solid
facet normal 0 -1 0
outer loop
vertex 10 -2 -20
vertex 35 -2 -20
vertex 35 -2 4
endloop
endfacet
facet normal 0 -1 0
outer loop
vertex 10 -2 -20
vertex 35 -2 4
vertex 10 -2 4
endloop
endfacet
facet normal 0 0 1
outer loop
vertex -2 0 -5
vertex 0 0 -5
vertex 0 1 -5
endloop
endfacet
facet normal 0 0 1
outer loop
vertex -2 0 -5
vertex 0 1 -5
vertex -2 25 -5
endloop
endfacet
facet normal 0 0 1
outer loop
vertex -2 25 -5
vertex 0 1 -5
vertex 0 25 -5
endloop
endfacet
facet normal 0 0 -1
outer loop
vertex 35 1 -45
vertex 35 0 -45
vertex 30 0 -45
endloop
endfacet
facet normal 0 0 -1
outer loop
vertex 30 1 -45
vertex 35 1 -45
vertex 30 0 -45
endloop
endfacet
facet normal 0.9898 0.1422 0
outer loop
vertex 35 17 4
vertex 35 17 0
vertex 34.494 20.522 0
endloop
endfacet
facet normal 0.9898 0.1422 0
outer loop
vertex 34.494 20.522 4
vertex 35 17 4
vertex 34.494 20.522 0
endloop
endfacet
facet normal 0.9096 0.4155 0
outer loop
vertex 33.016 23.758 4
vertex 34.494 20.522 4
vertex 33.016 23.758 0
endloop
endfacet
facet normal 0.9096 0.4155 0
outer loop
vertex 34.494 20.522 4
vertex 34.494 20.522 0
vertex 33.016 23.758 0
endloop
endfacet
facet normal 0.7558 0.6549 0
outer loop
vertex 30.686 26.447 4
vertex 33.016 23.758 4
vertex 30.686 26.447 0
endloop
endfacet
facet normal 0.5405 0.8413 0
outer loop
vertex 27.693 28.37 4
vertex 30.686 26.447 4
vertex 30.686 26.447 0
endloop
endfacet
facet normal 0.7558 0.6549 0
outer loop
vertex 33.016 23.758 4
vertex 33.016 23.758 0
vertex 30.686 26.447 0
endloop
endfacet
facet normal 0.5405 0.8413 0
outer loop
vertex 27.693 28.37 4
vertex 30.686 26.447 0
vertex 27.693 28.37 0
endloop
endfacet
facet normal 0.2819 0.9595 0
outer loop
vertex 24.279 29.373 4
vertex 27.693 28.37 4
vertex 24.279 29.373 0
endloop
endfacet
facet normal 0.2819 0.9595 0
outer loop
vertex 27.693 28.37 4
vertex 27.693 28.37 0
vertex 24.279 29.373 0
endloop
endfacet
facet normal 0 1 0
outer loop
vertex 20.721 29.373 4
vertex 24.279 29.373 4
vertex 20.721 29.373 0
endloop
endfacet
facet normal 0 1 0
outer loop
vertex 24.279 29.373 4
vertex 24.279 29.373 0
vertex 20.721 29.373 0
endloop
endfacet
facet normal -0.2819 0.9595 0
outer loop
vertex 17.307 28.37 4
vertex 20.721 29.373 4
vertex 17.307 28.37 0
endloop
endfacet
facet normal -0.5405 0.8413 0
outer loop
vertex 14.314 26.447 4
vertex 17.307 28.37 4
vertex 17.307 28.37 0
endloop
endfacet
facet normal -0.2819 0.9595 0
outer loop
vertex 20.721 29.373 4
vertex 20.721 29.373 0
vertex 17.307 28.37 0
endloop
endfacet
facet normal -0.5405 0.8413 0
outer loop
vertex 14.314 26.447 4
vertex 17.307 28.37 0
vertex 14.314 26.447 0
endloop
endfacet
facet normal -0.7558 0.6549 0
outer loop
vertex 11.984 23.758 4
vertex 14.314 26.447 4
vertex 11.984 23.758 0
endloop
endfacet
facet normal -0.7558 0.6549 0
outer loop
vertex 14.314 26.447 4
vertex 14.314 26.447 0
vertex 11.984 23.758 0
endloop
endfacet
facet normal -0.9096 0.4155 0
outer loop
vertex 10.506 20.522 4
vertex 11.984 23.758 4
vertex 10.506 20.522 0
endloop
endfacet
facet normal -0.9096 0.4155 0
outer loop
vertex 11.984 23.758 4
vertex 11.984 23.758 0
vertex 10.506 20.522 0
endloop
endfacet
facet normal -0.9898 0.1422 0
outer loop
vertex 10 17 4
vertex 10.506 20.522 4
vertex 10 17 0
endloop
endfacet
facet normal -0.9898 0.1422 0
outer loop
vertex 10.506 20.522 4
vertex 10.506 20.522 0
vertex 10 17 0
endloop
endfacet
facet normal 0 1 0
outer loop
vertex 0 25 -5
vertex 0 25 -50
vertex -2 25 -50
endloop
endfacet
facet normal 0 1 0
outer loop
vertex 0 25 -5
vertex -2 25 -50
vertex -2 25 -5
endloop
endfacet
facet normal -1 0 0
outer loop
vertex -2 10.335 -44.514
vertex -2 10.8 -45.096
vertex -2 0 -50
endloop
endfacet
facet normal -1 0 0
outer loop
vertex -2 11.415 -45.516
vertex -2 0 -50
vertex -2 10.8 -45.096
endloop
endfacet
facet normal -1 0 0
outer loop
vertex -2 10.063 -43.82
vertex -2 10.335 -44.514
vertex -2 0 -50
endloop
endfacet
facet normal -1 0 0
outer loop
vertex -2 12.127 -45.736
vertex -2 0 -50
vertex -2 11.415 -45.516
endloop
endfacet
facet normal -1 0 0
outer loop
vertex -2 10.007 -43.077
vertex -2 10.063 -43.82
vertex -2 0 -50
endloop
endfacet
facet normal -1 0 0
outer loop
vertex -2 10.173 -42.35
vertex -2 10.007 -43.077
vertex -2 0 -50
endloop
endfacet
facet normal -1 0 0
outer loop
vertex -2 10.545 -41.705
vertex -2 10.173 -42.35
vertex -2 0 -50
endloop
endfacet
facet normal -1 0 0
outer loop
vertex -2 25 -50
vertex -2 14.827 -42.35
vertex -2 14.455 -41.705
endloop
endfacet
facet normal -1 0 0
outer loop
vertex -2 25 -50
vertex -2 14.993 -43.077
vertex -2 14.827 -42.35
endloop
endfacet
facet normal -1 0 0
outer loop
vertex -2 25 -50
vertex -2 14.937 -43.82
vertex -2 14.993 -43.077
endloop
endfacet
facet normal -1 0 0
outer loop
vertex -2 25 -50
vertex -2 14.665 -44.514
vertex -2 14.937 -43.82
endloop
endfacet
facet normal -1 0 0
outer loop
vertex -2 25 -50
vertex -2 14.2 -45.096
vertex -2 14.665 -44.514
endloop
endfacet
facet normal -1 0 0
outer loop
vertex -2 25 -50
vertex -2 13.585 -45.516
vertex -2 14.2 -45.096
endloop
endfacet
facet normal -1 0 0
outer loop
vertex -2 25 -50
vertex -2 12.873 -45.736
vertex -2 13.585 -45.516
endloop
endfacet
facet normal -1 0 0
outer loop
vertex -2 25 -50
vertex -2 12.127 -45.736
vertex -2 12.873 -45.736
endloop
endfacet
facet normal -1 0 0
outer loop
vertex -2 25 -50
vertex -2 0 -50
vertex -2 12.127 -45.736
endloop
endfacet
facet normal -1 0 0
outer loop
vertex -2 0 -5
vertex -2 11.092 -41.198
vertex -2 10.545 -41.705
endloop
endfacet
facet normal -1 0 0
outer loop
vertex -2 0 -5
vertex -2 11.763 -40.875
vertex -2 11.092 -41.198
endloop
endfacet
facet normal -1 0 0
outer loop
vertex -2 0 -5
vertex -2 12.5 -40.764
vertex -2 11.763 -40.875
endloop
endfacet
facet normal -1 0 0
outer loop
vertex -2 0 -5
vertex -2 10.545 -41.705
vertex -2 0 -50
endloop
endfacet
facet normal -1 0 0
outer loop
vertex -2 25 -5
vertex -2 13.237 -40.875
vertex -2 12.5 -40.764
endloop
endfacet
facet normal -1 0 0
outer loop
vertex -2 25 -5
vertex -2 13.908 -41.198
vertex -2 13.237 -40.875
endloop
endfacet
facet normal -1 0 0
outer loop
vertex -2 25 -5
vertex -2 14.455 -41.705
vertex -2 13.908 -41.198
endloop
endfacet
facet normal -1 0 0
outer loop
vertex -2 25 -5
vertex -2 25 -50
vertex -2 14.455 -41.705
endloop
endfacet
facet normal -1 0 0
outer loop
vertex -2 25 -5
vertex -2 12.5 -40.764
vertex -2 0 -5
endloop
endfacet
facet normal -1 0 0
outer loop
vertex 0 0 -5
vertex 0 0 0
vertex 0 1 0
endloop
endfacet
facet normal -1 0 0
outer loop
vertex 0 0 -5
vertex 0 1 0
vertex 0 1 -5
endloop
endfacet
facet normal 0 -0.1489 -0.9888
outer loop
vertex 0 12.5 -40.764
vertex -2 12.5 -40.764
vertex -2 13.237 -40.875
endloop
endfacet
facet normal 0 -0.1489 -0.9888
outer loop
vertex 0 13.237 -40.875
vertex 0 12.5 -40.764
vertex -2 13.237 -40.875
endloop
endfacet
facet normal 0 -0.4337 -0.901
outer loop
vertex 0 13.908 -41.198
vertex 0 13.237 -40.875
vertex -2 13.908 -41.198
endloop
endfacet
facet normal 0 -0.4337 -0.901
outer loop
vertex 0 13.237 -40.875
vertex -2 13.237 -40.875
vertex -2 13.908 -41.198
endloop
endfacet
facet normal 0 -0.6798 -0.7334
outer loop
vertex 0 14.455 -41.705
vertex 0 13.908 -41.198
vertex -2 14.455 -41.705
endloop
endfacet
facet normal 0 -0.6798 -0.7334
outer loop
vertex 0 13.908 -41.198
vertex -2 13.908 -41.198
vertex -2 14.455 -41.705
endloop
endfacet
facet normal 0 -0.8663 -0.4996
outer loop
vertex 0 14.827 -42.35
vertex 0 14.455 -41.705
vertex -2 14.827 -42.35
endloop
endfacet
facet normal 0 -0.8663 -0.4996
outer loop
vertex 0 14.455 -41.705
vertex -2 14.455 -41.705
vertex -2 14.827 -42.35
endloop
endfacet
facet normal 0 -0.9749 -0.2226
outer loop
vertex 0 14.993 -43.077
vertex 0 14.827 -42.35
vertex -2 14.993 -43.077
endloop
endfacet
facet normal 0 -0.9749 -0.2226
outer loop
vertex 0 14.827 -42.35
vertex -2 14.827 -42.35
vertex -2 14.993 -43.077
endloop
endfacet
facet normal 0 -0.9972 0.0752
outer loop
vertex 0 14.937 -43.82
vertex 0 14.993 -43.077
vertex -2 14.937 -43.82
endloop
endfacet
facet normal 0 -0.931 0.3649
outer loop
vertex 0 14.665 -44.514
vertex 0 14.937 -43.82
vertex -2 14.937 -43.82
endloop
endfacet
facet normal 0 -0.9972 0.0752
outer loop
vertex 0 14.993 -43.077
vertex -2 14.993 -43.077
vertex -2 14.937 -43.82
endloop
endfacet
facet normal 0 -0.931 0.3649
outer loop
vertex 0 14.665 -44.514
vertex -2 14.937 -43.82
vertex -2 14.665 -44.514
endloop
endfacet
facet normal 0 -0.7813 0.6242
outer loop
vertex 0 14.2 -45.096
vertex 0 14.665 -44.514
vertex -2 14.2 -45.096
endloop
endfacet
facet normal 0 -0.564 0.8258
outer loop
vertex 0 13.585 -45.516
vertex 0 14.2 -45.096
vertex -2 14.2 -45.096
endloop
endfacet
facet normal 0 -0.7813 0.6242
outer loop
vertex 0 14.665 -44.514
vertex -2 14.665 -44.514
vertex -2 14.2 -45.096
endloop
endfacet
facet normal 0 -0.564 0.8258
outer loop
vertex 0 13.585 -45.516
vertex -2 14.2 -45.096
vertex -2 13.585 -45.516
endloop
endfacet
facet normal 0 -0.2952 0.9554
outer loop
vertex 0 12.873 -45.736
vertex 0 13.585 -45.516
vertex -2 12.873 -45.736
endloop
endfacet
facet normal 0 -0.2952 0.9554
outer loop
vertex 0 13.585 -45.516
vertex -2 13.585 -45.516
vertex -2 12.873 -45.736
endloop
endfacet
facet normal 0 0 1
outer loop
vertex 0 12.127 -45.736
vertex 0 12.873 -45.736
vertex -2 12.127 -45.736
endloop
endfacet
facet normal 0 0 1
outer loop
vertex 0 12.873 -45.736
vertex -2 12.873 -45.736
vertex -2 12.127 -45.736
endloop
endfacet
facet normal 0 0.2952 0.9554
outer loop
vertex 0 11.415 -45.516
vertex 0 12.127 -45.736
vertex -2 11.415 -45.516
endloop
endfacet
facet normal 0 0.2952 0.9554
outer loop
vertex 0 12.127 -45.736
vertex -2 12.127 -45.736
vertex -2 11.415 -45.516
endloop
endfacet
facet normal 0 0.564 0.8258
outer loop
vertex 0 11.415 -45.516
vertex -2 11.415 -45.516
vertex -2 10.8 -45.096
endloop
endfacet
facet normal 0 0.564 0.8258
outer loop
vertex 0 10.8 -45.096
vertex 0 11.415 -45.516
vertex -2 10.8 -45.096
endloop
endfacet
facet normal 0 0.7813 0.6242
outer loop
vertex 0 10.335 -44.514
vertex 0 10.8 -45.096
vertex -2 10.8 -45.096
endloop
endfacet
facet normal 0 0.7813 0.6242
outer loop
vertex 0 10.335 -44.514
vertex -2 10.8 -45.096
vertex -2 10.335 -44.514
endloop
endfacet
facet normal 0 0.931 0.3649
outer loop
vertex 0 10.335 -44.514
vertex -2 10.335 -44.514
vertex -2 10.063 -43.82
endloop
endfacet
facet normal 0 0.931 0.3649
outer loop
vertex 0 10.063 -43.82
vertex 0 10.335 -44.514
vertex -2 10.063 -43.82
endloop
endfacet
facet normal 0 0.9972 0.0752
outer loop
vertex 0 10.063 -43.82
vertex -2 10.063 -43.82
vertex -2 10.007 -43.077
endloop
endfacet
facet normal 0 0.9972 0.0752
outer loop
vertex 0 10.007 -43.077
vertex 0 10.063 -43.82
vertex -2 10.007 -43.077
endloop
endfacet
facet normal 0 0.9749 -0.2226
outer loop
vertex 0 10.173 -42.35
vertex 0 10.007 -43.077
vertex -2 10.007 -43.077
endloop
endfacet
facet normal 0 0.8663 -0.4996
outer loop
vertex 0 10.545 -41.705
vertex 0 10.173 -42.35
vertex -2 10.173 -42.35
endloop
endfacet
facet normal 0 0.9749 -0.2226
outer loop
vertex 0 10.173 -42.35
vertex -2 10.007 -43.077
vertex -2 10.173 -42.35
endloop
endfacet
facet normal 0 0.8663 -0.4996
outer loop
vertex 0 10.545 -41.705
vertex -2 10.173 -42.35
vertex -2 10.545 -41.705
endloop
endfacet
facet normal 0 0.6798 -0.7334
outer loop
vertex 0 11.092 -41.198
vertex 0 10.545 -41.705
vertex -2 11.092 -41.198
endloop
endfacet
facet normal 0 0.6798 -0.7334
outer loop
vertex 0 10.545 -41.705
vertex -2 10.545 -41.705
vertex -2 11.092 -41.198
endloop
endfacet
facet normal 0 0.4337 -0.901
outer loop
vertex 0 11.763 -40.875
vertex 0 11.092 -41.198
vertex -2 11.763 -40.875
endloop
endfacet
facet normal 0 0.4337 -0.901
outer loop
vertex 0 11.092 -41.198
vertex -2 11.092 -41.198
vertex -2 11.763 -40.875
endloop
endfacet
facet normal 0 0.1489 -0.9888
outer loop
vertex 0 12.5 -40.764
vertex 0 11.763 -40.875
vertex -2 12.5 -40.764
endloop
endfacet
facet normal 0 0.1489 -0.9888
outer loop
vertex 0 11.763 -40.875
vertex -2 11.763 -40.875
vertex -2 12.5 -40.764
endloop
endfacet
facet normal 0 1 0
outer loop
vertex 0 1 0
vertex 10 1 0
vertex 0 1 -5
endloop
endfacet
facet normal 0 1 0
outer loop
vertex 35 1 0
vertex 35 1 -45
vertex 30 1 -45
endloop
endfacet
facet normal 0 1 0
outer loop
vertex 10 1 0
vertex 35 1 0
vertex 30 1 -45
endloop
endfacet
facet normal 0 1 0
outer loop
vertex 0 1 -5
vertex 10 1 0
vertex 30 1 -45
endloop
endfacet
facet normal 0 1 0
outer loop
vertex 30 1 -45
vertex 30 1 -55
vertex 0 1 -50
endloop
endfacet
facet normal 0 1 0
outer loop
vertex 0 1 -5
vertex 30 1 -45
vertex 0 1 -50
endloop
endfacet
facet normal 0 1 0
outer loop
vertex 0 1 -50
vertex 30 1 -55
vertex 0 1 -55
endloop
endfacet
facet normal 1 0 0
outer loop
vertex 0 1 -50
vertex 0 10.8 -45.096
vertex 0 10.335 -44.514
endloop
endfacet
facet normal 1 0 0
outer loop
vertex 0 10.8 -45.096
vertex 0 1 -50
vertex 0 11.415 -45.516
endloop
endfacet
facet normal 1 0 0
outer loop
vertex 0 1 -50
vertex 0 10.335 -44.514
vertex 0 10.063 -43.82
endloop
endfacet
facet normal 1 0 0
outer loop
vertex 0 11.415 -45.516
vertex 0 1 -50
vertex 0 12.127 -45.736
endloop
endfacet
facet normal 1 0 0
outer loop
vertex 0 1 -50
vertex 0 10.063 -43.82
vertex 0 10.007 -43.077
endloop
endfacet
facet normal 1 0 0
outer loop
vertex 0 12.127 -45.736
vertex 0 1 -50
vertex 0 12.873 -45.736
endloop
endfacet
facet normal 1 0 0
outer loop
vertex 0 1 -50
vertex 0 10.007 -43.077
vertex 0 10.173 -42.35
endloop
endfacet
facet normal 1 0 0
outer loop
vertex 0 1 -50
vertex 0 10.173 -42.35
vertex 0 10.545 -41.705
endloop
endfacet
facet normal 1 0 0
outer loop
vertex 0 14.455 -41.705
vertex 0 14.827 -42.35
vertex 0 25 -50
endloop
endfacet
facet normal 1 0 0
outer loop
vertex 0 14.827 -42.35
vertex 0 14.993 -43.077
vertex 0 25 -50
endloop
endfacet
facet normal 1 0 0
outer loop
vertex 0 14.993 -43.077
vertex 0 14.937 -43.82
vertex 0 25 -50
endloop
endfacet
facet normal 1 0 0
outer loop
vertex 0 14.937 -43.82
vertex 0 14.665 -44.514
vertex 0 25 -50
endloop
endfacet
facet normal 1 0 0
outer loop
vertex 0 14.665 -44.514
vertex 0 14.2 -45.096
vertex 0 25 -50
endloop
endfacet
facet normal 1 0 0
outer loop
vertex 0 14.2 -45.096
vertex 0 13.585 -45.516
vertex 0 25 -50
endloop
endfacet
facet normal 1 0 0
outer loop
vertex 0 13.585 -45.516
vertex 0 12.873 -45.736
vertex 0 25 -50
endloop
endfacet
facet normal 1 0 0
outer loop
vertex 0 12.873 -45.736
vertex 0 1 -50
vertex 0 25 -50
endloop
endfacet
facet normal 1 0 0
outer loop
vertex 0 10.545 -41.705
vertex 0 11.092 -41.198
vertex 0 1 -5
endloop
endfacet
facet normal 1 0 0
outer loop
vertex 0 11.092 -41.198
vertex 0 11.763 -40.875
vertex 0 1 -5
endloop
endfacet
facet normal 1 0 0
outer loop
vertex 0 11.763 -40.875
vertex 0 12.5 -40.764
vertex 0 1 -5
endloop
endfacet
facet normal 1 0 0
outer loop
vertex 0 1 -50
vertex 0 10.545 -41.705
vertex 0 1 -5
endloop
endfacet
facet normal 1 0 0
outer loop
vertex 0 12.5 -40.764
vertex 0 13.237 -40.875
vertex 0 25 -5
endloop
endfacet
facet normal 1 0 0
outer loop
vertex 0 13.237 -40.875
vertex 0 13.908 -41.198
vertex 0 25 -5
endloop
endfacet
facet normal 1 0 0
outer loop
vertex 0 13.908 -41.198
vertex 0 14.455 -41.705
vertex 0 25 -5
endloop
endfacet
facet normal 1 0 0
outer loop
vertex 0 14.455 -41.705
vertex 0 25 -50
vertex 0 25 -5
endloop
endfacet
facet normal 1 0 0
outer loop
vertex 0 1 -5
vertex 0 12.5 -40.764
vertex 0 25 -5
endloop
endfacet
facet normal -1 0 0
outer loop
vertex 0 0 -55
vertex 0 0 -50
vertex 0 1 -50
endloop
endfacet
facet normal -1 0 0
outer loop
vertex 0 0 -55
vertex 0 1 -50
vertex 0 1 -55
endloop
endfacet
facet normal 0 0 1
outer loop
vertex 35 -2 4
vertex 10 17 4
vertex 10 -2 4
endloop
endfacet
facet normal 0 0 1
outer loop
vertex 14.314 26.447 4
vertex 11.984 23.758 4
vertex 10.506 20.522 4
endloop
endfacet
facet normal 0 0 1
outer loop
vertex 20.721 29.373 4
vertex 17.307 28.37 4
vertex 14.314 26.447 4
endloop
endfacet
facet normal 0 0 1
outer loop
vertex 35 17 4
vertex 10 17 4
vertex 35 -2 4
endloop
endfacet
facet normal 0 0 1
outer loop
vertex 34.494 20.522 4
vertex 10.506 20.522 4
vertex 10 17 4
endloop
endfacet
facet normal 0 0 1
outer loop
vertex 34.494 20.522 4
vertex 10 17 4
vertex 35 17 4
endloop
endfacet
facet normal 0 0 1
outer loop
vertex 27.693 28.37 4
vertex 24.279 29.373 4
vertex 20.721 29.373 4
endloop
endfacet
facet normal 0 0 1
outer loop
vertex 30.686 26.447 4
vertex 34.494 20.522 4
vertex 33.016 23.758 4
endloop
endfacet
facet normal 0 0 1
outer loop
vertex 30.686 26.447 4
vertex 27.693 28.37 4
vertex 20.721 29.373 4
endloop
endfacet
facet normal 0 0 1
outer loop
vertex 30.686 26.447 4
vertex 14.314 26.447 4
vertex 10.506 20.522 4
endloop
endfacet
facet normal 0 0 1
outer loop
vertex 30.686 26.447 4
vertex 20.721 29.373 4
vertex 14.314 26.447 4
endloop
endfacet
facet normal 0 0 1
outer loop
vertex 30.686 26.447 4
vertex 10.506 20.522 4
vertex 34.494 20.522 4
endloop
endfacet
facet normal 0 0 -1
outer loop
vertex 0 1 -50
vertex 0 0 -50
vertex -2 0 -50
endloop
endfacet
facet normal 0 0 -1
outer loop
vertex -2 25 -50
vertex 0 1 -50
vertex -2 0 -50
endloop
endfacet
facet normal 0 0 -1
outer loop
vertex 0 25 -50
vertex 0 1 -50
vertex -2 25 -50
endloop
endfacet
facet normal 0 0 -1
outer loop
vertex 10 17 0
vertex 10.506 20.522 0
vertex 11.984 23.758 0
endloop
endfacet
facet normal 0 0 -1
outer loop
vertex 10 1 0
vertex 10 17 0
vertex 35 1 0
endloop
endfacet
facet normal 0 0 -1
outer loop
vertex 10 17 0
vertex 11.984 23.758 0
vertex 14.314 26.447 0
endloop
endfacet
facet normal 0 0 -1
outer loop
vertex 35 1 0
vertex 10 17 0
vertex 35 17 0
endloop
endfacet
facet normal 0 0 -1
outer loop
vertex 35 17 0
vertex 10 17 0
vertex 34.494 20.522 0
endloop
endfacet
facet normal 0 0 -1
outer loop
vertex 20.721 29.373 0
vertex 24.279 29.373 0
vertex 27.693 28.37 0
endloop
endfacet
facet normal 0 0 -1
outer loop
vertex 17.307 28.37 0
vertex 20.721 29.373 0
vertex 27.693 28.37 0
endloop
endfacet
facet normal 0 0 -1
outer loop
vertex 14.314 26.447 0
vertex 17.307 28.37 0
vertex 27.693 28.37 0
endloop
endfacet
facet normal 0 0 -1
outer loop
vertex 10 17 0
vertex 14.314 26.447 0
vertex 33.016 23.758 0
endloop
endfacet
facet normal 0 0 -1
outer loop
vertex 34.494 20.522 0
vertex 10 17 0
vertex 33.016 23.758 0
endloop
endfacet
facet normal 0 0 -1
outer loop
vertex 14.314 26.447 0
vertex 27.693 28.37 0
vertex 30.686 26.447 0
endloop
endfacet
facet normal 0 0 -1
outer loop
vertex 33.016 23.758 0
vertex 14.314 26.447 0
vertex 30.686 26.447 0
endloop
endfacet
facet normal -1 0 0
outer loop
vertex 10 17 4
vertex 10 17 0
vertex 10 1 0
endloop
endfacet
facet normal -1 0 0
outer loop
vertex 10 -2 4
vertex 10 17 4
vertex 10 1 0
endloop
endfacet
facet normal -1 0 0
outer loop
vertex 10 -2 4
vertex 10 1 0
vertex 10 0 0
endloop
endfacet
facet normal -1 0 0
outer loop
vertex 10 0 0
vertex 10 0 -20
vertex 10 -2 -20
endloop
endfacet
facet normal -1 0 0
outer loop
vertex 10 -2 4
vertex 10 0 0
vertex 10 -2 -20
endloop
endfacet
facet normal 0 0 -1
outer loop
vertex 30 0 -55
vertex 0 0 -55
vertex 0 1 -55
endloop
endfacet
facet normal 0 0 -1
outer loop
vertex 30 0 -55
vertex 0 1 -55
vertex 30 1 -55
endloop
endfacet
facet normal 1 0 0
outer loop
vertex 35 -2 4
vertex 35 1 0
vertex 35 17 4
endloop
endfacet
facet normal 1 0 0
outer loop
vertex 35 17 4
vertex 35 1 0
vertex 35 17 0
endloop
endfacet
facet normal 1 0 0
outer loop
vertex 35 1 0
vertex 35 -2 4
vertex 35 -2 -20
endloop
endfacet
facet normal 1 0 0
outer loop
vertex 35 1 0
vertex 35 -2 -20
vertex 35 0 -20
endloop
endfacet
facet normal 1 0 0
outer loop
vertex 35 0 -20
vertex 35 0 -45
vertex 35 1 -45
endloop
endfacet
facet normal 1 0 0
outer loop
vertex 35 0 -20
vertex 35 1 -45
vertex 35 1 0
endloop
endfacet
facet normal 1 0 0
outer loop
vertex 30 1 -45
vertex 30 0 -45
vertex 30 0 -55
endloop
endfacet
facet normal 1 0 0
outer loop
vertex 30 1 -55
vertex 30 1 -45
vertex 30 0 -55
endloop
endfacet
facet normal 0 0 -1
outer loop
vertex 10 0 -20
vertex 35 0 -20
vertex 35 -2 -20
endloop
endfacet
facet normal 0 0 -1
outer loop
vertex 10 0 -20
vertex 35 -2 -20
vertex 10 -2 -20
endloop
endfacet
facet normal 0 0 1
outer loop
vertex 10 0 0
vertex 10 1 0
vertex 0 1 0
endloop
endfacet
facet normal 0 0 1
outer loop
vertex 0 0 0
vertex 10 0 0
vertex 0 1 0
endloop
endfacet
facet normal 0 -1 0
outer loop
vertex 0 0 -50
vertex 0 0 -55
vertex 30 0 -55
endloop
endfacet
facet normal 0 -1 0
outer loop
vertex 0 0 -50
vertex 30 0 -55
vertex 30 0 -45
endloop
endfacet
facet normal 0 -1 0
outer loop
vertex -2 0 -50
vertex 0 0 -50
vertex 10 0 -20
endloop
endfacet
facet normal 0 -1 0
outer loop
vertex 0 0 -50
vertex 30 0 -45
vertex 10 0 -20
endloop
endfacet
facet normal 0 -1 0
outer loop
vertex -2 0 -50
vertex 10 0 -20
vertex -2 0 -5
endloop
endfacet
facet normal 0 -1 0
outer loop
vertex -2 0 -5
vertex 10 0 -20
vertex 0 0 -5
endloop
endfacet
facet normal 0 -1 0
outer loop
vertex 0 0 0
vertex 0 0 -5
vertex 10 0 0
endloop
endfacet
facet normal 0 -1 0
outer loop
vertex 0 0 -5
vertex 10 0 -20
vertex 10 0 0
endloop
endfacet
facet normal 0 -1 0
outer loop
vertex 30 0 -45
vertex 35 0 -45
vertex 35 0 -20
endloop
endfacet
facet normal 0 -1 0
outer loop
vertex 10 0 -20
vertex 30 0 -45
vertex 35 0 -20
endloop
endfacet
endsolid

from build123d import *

# Parameters (mm, degrees)
ESQUISSE1_W             = 35
ESQUISSE1_H             = 55
BOSS_EXTRU_1_DEPTH      = 1
ESQUISSE2_W             = 45
ESQUISSE2_H             = 25
BOSS_EXTRU_2_DEPTH      = 2
ESQUISSE3_W             = 5
ESQUISSE3_H             = 10
ENL_V_MAT_EXTRU_1_DEPTH = 2
ESQUISSE5_W             = 25
ESQUISSE5_H             = 20
BOSS_EXTRU_3_DEPTH      = 2
BOSS_EXTRU_4_DEPTH      = 2
SYM_TRIE1_DEPTH         = 4
ESQUISSE7_W             = 13.982195968
ESQUISSE7_H             = 28.94332856
ENL_V_MAT_EXTRU_2_DEPTH = 50
ESQUISSE8_R             = 2.5
ENL_V_MAT_EXTRU_3_DEPTH = 2


# Read off the part's stored shape, not the designer's step: Symétrie1
with BuildPart() as part:
    # Esquisse1 → Boss.-Extru.1 (new body)
    with BuildSketch(Plane(origin=(0, 0, 0), x_dir=(1, 0, 0), z_dir=(0, 1, 0))):
        with Locations((17.5, 27.5)):
            Rectangle(ESQUISSE1_W, ESQUISSE1_H)
    extrude(amount=BOSS_EXTRU_1_DEPTH)

    # Esquisse2 → Boss.-Extru.2 (add)
    with BuildSketch(Plane.ZY):
        with Locations((-27.5, 12.5)):
            Rectangle(ESQUISSE2_W, ESQUISSE2_H)
    extrude(amount=BOSS_EXTRU_2_DEPTH)

    # Esquisse3 → Enlèv. mat.-Extru.1 (cut)
    with BuildSketch(Plane(origin=(0, 0, 0), x_dir=(-1, 0, 0), z_dir=(0, -1, 0))):
        with Locations((-32.5, 50)):
            Rectangle(ESQUISSE3_W, ESQUISSE3_H)
    extrude(amount=-ENL_V_MAT_EXTRU_1_DEPTH, mode=Mode.SUBTRACT)

    # Esquisse5 → Boss.-Extru.3 (add)
    with BuildSketch(Plane(origin=(0, 0, 0), x_dir=(-1, 0, 0), z_dir=(0, -1, 0))):
        with Locations((-22.5, 10)):
            Rectangle(ESQUISSE5_W, ESQUISSE5_H)
    extrude(amount=BOSS_EXTRU_3_DEPTH)

    # Esquisse6 → Boss.-Extru.4 (add)
    with BuildSketch(Plane.XY):
        with BuildLine():
            Line((35, 1), (10, 1))
            Line((10, 1), (10, -15))
            ThreePointArc((10, -15), (22.5, -27.5), (35, -15))
            Line((35, -15), (35, 1))
        make_face()
    extrude(amount=BOSS_EXTRU_4_DEPTH)

    # Symétrie1 outline → Symétrie1 (add)
    with BuildSketch(Plane.XY):
        with BuildLine():
            Line((35, -15), (35, 17))
            ThreePointArc((35, 17), (22.5, 29.5), (10, 17))
            Line((10, 17), (10, -15))
            ThreePointArc((10, -15), (22.5, -27.5), (35, -15))
        make_face()
    extrude(amount=SYM_TRIE1_DEPTH)

    # Esquisse7 → Enlèv. mat.-Extru.2 (cut)
    with BuildSketch(Plane.ZY.offset(-10)):
        with Locations((6.991097984, -16.47166428)):
            Rectangle(ESQUISSE7_W, ESQUISSE7_H)
    extrude(amount=-ENL_V_MAT_EXTRU_2_DEPTH, mode=Mode.SUBTRACT)

    # Esquisse8 → Enlèv. mat.-Extru.3 (cut)
    with BuildSketch(Plane.ZY.offset(2)):
        with Locations((-43.263662177, 12.5)):
            Circle(ESQUISSE8_R)
    extrude(amount=-ENL_V_MAT_EXTRU_3_DEPTH, mode=Mode.SUBTRACT)


solid = part.part
